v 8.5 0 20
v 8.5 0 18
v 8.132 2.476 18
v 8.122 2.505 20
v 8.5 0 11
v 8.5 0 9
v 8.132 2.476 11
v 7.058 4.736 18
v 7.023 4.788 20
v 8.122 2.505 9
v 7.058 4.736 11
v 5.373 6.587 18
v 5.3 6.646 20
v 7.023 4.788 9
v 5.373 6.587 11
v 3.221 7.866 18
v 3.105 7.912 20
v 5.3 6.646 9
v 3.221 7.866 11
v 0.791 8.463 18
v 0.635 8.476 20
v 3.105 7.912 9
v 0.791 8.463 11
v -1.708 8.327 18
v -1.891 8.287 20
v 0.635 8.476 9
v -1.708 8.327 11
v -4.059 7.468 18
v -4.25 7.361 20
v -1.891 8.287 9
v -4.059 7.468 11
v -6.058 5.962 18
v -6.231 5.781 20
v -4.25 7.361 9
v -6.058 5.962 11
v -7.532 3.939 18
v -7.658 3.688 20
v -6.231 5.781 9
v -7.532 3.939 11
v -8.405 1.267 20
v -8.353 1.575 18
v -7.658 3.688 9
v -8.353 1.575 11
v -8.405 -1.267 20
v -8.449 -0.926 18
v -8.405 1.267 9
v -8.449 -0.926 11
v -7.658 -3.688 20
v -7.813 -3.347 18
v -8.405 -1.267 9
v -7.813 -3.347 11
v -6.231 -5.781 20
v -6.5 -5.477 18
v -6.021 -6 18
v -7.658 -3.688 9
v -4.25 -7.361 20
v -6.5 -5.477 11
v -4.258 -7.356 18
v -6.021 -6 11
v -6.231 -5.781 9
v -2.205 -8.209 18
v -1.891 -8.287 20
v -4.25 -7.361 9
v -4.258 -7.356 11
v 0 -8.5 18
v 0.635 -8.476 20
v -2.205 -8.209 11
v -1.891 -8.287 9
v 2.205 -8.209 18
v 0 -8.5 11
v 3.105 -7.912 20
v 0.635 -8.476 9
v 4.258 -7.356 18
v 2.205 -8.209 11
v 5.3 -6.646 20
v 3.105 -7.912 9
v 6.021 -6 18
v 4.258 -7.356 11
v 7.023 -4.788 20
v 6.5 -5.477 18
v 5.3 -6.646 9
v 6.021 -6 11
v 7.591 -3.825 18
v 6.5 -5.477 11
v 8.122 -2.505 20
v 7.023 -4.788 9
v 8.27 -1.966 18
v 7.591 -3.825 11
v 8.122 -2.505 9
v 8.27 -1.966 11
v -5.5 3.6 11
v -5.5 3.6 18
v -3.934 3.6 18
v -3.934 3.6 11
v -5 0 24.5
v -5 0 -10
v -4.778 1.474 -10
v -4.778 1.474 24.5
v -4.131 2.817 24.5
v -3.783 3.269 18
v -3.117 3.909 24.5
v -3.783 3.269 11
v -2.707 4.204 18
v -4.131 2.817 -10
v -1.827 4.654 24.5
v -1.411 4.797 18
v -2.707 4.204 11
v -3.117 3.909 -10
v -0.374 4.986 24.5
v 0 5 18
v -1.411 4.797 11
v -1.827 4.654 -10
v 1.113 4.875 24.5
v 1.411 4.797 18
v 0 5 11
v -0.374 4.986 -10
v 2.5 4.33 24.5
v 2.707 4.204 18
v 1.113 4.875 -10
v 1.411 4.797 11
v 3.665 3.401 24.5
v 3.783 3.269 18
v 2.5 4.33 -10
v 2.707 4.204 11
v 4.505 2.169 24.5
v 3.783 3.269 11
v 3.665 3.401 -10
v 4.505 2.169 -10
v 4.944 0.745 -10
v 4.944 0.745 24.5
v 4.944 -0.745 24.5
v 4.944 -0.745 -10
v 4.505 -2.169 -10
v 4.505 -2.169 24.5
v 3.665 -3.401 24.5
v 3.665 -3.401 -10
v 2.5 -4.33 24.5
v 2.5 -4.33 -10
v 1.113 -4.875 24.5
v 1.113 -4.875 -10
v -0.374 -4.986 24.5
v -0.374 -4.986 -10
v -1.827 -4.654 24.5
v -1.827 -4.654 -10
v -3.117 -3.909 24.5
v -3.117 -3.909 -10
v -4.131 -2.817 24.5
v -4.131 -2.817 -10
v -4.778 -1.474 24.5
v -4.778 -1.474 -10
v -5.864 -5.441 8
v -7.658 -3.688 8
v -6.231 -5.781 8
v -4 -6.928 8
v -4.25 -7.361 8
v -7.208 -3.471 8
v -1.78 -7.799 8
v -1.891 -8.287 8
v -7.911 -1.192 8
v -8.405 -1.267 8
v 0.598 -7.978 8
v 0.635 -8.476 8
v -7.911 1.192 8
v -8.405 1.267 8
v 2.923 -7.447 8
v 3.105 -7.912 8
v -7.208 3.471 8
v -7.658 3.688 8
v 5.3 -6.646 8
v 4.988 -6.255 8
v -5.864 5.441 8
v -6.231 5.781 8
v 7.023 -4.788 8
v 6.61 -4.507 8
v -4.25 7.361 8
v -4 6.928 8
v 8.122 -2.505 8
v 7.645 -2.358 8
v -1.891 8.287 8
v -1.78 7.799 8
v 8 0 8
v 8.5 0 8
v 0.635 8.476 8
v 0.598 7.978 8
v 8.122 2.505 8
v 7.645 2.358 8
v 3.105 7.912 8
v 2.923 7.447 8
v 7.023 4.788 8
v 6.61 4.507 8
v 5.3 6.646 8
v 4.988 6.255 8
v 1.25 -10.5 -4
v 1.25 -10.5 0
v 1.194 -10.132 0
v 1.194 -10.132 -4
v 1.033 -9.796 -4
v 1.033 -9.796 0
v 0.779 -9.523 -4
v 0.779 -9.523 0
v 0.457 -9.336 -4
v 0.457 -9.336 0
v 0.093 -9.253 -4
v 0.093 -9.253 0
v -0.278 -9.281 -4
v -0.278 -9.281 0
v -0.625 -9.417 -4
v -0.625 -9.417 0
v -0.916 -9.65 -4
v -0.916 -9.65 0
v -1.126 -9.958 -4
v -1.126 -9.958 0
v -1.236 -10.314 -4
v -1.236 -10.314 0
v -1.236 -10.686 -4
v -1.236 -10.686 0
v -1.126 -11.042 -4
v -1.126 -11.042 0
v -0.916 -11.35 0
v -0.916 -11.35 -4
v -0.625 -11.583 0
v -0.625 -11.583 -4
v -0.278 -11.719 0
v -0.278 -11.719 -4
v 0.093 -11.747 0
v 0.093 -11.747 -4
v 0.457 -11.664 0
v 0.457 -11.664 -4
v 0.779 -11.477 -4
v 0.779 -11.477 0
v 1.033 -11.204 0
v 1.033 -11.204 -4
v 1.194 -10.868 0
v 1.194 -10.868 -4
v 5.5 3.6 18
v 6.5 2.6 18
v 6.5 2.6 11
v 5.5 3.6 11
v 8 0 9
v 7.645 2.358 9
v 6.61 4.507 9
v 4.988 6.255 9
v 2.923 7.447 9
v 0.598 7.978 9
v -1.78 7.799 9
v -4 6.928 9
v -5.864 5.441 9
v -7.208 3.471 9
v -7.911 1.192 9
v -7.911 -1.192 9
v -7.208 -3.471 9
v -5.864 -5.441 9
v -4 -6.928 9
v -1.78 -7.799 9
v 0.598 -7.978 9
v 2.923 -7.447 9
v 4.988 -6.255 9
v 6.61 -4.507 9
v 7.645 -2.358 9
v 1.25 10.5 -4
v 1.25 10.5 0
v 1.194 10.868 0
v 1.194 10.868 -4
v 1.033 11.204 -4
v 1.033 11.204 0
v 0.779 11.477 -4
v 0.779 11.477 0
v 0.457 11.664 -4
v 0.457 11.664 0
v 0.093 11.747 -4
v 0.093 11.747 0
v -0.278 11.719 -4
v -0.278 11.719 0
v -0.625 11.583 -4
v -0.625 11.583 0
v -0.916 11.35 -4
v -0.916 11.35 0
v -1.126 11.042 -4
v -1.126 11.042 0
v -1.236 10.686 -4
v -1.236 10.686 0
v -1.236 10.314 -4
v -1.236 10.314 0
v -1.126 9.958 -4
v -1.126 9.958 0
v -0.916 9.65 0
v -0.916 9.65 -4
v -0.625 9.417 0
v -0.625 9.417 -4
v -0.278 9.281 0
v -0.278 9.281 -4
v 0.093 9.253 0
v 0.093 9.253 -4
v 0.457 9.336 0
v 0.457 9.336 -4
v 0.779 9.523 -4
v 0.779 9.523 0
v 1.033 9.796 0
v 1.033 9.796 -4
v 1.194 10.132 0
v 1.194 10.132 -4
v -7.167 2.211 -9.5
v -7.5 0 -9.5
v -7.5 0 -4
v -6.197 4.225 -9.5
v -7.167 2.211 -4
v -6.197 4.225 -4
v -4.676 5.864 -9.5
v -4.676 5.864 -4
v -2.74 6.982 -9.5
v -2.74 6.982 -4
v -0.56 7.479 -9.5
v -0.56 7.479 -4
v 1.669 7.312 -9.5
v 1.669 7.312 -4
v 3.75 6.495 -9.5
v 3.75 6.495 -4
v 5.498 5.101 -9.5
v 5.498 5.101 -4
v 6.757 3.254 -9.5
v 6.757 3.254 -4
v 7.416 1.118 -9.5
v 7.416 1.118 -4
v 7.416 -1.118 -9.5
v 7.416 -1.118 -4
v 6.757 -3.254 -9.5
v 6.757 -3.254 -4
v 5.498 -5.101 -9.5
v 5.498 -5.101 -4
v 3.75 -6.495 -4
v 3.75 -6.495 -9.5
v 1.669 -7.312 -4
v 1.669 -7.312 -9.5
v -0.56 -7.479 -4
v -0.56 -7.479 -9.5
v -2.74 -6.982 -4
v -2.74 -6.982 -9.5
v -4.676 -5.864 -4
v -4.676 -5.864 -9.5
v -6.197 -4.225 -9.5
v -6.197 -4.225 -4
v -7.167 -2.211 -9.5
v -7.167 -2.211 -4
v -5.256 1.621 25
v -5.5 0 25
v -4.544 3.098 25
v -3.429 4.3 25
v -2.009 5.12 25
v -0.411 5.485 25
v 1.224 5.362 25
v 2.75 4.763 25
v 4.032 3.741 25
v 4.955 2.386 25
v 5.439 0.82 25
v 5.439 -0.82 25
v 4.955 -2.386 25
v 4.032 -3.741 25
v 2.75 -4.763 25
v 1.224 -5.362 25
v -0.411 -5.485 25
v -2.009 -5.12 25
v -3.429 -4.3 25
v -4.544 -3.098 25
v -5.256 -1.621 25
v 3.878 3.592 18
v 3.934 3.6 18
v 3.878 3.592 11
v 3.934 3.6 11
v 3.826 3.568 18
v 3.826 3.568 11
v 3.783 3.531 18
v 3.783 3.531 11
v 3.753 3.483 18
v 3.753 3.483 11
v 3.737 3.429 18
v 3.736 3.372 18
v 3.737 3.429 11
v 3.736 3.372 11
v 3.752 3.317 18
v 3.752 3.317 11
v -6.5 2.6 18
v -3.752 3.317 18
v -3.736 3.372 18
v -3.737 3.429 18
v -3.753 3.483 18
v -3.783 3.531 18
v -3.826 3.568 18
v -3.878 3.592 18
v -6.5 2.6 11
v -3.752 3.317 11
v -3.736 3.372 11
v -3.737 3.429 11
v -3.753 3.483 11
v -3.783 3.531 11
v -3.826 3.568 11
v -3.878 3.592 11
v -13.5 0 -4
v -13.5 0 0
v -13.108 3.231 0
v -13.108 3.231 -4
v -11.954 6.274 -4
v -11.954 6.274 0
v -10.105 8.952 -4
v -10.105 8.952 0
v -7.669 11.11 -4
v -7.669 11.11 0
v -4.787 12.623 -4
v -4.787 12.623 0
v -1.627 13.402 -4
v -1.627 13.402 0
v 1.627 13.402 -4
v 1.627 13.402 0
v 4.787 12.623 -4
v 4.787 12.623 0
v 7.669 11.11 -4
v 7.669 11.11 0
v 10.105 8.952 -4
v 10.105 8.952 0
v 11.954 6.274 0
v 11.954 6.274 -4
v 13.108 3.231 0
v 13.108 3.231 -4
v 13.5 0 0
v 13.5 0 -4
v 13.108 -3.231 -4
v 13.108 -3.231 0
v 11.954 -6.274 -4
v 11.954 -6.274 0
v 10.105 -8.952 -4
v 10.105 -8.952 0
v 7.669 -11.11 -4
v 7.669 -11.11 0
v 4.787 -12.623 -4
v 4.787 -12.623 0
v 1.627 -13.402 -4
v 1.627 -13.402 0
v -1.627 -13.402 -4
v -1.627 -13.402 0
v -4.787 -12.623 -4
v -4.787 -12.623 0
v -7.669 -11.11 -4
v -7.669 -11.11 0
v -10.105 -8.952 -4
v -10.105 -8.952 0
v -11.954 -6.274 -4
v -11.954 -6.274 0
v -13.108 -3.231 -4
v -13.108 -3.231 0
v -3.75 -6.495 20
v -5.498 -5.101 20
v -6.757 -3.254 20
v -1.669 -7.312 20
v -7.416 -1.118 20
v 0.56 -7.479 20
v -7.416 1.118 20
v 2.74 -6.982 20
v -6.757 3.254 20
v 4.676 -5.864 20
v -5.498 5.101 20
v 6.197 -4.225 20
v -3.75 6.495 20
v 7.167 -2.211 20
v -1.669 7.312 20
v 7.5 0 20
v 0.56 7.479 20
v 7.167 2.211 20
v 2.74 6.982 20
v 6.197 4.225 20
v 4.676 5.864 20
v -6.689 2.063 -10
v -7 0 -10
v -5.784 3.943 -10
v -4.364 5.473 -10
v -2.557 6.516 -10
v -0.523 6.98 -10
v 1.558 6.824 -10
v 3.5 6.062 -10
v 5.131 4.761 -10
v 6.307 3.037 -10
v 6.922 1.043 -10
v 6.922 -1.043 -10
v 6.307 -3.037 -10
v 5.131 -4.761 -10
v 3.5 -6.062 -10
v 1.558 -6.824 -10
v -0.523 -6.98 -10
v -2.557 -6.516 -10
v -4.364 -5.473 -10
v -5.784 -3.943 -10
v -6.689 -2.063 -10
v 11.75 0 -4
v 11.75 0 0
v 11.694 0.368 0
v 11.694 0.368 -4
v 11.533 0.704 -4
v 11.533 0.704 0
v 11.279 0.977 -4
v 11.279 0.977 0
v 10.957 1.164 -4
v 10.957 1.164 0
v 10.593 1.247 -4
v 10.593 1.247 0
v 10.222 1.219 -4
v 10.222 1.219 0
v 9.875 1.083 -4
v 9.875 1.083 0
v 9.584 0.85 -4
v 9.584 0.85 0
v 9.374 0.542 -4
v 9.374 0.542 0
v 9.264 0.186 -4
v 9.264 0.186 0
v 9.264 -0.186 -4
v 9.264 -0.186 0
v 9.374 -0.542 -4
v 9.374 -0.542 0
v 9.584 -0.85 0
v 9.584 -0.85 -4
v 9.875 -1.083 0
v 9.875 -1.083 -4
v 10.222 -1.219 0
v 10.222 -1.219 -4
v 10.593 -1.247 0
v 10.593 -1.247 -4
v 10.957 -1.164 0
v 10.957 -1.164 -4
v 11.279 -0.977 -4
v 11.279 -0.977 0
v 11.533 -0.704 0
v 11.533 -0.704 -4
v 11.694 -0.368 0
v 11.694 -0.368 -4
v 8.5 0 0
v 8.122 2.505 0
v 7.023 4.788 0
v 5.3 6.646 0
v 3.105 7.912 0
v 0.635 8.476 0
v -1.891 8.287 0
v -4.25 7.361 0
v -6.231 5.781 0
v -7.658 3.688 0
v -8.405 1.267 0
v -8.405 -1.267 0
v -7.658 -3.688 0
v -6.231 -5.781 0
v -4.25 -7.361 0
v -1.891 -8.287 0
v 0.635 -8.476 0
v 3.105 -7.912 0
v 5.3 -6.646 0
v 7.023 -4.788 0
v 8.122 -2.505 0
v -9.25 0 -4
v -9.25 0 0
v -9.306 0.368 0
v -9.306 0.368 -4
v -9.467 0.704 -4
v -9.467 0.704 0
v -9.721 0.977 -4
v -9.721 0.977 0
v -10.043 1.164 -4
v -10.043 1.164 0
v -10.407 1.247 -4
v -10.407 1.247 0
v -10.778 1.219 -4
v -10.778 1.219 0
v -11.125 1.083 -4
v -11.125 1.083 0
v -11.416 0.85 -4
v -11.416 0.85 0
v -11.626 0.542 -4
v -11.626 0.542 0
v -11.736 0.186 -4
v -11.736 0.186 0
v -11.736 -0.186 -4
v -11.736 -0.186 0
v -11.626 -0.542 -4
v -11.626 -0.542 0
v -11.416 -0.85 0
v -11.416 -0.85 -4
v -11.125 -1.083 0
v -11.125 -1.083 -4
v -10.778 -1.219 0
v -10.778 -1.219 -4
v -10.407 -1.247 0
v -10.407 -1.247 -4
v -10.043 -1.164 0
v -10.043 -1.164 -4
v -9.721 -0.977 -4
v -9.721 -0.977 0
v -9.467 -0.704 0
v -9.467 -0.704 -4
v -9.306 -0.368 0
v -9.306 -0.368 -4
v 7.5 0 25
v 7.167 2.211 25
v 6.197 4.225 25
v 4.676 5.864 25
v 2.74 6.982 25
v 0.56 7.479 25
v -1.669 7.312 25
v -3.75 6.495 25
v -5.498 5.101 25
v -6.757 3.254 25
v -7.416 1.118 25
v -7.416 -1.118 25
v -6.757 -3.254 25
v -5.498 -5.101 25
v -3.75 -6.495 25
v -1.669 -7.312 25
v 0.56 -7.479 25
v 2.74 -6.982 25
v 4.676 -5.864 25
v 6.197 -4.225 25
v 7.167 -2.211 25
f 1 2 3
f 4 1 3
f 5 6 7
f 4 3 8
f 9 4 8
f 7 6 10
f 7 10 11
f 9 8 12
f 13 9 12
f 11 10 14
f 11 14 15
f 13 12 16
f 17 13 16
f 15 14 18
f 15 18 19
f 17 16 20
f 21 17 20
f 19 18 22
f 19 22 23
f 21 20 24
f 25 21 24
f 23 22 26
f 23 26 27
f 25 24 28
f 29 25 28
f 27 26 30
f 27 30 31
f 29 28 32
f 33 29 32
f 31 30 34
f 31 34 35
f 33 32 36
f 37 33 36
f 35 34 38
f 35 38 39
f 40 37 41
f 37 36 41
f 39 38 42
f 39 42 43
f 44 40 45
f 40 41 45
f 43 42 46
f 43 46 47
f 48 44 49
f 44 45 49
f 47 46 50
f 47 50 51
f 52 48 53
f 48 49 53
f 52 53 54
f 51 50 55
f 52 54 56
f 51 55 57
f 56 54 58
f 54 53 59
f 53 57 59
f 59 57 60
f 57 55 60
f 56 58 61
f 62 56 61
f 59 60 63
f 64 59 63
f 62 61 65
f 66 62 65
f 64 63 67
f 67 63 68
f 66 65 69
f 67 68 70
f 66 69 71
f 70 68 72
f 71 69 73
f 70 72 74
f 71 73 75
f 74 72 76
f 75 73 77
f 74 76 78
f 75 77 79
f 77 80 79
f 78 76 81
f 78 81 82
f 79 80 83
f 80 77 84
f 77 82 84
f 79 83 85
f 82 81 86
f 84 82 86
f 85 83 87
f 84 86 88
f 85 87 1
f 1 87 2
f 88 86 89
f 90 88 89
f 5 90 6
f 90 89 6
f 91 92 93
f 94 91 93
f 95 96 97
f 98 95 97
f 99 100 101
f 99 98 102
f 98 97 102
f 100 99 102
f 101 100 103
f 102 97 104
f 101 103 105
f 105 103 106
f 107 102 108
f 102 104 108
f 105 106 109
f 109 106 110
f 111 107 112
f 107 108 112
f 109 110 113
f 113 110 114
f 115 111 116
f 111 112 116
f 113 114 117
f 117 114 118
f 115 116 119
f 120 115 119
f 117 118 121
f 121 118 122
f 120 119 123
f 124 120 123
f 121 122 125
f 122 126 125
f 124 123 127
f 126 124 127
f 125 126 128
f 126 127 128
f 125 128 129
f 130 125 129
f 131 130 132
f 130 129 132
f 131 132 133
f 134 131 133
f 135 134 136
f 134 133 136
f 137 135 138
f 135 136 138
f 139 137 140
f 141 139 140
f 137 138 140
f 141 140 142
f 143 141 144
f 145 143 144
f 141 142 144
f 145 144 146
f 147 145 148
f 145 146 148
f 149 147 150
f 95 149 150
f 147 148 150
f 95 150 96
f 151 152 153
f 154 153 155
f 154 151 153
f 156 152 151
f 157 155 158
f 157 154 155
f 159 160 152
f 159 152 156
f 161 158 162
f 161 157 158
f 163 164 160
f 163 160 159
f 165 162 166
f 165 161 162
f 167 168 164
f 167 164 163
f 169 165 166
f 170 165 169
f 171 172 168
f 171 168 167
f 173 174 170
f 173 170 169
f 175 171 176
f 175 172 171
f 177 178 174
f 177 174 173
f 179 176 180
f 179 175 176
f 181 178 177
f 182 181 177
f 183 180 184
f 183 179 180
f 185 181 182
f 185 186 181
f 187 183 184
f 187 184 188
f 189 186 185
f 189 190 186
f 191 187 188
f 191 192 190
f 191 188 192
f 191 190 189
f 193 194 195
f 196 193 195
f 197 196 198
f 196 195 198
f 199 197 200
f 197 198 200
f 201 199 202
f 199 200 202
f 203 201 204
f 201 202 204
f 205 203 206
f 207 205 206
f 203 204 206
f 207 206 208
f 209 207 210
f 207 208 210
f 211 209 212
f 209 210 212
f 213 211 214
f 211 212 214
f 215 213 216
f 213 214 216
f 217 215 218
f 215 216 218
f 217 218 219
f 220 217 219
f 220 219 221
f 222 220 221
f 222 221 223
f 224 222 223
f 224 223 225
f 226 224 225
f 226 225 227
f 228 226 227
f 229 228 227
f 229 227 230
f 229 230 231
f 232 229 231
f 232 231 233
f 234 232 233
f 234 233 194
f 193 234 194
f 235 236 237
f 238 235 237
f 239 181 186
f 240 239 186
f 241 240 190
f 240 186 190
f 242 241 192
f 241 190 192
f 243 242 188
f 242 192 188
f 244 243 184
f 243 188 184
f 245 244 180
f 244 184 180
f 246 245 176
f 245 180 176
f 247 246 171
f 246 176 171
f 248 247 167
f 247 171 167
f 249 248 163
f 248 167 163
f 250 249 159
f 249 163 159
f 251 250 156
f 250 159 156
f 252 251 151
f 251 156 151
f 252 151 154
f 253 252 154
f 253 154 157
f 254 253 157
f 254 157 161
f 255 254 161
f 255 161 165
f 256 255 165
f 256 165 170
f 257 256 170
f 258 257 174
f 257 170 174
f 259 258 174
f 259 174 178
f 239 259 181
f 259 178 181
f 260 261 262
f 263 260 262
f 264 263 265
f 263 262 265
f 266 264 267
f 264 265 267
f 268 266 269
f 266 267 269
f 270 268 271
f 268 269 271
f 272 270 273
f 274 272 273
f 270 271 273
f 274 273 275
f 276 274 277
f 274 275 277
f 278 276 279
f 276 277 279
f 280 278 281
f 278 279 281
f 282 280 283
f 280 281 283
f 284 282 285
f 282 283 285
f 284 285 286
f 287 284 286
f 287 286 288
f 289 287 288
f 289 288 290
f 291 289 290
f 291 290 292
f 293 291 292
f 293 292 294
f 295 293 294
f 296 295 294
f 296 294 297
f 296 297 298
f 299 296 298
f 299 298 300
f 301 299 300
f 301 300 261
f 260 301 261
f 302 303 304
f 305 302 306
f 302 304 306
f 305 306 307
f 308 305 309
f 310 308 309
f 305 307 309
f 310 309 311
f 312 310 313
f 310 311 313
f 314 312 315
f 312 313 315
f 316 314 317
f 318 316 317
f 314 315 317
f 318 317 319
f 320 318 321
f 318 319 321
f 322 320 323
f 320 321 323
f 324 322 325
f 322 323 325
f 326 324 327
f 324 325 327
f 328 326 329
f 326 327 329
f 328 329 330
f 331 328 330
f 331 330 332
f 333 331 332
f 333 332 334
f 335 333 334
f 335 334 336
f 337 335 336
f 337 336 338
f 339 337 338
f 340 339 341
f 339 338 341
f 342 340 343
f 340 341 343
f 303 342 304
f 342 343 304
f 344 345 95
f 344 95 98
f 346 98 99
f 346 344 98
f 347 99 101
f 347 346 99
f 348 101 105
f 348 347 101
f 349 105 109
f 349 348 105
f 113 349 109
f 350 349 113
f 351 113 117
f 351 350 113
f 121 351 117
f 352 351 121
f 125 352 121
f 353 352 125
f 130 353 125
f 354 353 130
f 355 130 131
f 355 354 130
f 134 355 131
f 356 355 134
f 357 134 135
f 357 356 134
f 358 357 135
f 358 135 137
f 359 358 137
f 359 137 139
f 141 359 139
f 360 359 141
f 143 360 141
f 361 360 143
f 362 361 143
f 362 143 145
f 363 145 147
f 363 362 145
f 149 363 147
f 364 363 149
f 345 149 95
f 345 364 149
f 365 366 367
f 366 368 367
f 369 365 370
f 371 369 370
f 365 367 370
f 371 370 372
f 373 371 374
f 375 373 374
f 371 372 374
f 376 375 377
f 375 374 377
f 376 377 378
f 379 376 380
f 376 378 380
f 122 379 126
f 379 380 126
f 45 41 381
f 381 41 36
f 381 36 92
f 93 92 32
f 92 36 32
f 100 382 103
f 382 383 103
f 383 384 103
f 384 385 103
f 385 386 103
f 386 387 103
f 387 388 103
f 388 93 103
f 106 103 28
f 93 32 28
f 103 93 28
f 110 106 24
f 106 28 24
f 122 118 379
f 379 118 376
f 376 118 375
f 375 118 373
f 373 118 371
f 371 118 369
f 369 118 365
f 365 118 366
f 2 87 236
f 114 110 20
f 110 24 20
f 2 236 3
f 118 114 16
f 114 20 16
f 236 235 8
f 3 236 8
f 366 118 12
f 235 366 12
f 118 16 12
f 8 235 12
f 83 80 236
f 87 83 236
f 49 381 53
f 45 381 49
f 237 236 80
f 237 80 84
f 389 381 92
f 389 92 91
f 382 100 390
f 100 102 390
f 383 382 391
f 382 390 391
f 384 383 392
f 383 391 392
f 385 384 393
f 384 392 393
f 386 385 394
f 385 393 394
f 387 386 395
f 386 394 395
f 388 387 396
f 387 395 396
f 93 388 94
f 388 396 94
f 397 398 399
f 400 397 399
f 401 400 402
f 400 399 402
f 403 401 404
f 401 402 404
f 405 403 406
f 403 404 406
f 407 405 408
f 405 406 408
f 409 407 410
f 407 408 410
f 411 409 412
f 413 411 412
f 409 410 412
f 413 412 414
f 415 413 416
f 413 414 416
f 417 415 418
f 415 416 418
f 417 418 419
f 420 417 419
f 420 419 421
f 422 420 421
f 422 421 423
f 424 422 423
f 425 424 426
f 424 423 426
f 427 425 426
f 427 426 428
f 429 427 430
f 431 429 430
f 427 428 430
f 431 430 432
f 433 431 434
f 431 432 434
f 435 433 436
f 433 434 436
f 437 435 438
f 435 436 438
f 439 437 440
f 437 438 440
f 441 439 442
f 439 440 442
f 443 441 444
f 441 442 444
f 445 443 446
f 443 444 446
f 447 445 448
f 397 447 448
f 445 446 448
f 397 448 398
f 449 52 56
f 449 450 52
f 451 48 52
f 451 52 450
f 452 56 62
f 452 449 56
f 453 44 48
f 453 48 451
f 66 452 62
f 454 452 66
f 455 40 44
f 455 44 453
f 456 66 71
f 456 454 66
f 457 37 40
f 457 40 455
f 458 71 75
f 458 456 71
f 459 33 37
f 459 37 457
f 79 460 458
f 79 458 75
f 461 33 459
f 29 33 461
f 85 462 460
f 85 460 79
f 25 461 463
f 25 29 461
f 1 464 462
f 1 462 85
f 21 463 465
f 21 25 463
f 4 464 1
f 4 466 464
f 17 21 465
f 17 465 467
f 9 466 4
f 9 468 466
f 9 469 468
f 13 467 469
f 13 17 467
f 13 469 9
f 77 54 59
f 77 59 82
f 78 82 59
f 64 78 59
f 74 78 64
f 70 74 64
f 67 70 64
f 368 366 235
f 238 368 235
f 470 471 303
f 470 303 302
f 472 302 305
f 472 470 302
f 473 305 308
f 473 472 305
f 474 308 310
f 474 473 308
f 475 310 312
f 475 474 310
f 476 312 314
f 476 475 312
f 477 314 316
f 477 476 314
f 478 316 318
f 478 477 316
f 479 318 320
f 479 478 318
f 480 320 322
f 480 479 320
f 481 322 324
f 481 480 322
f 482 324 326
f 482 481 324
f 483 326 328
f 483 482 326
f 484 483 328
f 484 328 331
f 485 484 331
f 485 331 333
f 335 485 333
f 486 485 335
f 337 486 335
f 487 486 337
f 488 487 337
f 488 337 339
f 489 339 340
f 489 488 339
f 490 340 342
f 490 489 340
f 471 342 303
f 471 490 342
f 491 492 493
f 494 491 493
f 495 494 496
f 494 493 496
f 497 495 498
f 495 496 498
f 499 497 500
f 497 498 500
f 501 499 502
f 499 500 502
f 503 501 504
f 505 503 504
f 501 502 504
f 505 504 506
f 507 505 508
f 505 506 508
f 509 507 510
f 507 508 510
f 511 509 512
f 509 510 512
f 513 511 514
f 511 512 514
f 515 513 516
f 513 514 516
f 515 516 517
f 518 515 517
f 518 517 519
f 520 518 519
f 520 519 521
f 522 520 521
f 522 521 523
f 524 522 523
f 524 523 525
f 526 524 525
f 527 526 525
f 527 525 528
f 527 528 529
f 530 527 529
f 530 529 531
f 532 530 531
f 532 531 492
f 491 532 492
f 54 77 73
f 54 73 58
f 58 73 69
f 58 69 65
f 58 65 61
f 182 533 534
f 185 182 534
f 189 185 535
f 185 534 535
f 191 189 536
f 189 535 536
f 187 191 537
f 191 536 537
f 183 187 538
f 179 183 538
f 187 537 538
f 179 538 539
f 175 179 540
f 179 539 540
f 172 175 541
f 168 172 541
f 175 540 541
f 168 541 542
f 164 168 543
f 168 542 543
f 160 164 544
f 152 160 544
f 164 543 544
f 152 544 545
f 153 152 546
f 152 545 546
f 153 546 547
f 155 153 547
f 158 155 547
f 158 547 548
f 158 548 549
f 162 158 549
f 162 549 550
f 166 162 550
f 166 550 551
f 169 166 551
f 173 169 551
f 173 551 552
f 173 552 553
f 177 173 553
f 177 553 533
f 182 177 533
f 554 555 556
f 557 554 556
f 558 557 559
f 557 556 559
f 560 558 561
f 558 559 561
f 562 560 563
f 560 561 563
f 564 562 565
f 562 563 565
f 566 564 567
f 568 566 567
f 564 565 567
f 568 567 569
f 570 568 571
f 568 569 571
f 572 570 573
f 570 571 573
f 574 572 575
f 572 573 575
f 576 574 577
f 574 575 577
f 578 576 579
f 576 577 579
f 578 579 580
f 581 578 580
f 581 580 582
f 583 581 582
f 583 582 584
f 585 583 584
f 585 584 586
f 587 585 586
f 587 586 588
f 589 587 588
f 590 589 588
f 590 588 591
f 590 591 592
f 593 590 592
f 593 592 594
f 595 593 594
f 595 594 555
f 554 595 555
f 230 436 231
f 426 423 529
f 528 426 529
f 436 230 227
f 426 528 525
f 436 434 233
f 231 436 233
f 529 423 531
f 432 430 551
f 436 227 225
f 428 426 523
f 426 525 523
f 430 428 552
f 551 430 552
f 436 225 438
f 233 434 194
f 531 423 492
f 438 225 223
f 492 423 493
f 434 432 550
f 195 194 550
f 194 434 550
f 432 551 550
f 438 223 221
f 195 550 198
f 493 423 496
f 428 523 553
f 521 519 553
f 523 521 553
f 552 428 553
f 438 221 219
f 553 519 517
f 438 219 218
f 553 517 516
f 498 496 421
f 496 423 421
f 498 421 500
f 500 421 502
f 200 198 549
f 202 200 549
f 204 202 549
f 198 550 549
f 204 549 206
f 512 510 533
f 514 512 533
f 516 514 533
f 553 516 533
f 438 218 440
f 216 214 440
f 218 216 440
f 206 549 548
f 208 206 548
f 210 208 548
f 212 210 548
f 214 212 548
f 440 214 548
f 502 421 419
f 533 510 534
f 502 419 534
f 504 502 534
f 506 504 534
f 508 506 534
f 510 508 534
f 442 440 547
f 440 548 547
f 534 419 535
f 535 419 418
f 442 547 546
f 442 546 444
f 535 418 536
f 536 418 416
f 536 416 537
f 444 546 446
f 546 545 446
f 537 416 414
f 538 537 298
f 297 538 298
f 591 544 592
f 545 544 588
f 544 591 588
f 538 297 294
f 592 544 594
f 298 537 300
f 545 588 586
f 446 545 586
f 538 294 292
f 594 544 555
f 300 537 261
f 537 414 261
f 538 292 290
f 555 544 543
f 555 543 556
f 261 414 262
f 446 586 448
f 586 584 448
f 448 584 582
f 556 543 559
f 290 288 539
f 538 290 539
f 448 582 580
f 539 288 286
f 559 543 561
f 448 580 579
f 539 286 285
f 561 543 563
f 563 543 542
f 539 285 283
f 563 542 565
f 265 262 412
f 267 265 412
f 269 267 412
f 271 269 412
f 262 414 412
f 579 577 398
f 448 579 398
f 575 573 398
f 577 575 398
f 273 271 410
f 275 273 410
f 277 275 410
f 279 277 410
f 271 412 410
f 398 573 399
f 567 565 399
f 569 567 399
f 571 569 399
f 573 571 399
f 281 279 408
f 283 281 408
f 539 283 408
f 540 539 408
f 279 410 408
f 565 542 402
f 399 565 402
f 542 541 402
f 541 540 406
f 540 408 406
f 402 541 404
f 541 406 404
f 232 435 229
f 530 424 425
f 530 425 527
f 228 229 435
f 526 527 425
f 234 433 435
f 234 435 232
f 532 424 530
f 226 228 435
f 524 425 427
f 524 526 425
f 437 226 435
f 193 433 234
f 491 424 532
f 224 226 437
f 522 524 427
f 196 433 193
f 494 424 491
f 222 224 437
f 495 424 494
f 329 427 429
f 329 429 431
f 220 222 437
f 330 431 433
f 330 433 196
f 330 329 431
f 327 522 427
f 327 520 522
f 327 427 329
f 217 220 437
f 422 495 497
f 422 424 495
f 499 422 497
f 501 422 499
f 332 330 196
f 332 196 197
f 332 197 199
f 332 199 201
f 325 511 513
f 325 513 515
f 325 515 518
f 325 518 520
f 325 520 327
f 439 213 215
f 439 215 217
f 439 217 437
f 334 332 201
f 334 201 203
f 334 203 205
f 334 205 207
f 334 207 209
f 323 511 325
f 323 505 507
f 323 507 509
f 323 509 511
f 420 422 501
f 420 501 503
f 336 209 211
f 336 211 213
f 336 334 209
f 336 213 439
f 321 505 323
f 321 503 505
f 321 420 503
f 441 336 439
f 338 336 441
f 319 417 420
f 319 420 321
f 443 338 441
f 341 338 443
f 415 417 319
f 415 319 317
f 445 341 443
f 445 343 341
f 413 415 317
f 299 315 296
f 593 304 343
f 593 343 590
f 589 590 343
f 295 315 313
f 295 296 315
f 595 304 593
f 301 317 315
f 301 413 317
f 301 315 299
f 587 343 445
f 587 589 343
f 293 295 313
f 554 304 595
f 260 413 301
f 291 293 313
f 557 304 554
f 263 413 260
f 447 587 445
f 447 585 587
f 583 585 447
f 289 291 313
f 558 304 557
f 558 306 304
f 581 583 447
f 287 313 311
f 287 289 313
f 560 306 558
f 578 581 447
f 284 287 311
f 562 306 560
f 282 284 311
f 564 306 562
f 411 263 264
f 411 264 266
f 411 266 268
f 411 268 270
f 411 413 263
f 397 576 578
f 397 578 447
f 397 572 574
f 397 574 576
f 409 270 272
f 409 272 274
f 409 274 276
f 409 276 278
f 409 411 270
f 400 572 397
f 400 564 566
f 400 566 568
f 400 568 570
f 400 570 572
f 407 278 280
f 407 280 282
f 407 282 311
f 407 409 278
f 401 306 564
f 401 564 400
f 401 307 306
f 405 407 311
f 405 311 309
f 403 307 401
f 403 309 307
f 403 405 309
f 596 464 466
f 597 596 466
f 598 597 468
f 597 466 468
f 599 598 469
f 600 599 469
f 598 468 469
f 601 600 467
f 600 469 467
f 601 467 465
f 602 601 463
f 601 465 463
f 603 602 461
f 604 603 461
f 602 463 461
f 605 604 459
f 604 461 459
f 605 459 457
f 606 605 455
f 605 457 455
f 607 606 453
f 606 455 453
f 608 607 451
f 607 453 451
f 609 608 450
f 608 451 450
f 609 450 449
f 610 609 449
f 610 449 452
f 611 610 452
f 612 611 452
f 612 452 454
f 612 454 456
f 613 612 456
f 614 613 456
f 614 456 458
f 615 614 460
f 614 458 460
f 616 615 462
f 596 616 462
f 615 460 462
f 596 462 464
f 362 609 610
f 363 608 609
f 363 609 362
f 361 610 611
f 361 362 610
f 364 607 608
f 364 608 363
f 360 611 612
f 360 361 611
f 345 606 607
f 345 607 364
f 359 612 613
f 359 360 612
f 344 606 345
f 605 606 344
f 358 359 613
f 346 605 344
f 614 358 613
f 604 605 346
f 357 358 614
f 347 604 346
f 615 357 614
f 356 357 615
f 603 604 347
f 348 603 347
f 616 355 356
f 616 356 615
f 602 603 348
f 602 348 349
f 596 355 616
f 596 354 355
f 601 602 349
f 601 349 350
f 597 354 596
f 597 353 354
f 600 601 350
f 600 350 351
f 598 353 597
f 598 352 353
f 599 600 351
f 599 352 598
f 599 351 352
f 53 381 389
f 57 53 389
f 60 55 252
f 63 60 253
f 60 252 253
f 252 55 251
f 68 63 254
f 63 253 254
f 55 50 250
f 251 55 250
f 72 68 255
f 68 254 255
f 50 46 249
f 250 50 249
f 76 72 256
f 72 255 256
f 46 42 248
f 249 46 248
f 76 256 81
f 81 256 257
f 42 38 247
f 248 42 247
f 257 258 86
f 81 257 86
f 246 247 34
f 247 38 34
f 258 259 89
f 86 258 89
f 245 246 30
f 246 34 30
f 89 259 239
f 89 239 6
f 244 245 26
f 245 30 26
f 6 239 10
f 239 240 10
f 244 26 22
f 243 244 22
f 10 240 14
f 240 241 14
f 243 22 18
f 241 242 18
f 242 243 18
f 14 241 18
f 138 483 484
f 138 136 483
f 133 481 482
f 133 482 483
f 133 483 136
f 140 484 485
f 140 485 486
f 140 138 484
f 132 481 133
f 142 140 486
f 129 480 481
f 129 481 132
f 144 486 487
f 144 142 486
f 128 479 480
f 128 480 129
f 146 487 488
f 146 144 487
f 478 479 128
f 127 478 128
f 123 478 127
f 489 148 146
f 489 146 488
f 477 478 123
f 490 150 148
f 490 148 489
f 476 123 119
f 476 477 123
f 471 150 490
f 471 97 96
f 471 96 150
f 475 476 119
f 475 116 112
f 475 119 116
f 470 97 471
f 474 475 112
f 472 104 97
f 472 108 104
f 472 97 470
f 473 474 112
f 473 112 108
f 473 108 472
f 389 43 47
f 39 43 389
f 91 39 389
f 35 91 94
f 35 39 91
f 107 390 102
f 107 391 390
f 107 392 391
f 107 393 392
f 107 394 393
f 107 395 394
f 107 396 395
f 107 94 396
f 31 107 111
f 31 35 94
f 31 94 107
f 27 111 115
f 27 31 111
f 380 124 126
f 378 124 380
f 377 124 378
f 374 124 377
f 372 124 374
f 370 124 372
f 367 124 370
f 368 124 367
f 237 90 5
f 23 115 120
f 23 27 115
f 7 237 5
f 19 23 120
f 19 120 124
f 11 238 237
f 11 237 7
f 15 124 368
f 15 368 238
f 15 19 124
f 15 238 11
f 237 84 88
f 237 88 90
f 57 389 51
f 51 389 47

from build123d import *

# Parameters (mm, degrees)
SKETCH_1_R             = 8.5
EXTRUDE_1_DEPTH        = 20
SKETCH_2_R             = 7.5
EXTRUDE_2_DEPTH        = 5
SKETCH_3_R             = 8.5
SKETCH_3_R_2           = 8
CUT_EXTRUDE_1_DEPTH    = 1
SKETCH_5_R             = 13.5
EXTRUDE_3_DEPTH        = 4
SKETCH_7_R             = 7.5
EXTRUDE_4_DEPTH        = 6
SKETCH_9_R             = 5
CUT_EXTRUDE_3_DEPTH    = 36
CHAMFER_2_SIZE         = 0.5
CUT_EXTRUDE_4_DEPTH    = 7
SKETCH_12_W            = 4
SKETCH_12_H            = 7
CUT_EXTRUDE_5_DEPTH    = 18.1
CHAMFER_3_SIZE         = 0.5
CHAMFER_4_SIZE         = 1
FILLET_1_R             = 0.2
HOLE_WIZARD_M3_1_D     = 2.5
HOLE_WIZARD_M3_1_DEPTH = 4


with BuildPart() as part:
    # 草图1 → 凸台-拉伸1 (new body)
    with BuildSketch(Plane.XY):
        Circle(SKETCH_1_R)
    extrude(amount=EXTRUDE_1_DEPTH)

    # 草图2 → 凸台-拉伸2 (add)
    with BuildSketch(Plane.XY.offset(20)):
        Circle(SKETCH_2_R)
    extrude(amount=EXTRUDE_2_DEPTH)

    # 草图3 → 切除-拉伸1 (cut)
    with BuildSketch(Plane.XY.offset(8)):
        Circle(SKETCH_3_R)
        Circle(SKETCH_3_R_2, mode=Mode.SUBTRACT)
    extrude(amount=CUT_EXTRUDE_1_DEPTH, mode=Mode.SUBTRACT)

    # 草图5 → 凸台-拉伸3 (add)
    with BuildSketch(Plane(origin=(0, 0, 0), x_dir=(-1, 0, 0), z_dir=(0, 0, -1))):
        Circle(SKETCH_5_R)
    extrude(amount=EXTRUDE_3_DEPTH)

    # 草图7 → 凸台-拉伸4 (add)
    with BuildSketch(Plane(origin=(0, 0, -4), x_dir=(-1, 0, 0), z_dir=(0, 0, -1))):
        Circle(SKETCH_7_R)
    extrude(amount=EXTRUDE_4_DEPTH)

    # 草图9 → 切除-拉伸3 (cut, through all)
    with BuildSketch(Plane(origin=(0, 0, -10), x_dir=(-1, 0, 0), z_dir=(0, 0, -1))):
        Circle(SKETCH_9_R)
    extrude(amount=-CUT_EXTRUDE_3_DEPTH, mode=Mode.SUBTRACT)

    # 倒角2
    chamfer_2_edges = [part.edges().sort_by_distance(p)[0] for p in [
        (7.5, 0, -10),
    ]]
    chamfer(chamfer_2_edges, length=CHAMFER_2_SIZE)

    # 草图10 → 切除-拉伸4 (cut)
    with BuildSketch(Plane.XY.offset(18)):
        with BuildLine():
            Line((-7.7, 3.6), (7.7, 3.6))
            ThreePointArc((7.7, 3.6), (0, 8.5), (-7.7, 3.6))
        make_face()
        with BuildLine():
            Line((-6.020797289, -6), (6.020797289, -6))
            ThreePointArc((6.020797289, -6), (0, -8.5), (-6.020797289, -6))
        make_face()
    extrude(amount=-CUT_EXTRUDE_4_DEPTH, mode=Mode.SUBTRACT)

    # 草图12 → 切除-拉伸5 (cut, through all)
    with BuildSketch(Plane(origin=(0, 3.6, 0), x_dir=(1, 0, 0), z_dir=(0, 1, 0))):
        with Locations((-8.5, -14.5)):
            Rectangle(SKETCH_12_W, SKETCH_12_H)
        with Locations((8.5, -14.5)):
            Rectangle(SKETCH_12_W, SKETCH_12_H)
    extrude(amount=-CUT_EXTRUDE_5_DEPTH, mode=Mode.SUBTRACT)

    # 倒角3
    chamfer_3_edges = [part.edges().sort_by_distance(p)[0] for p in [
        (5, 0, 25),
    ]]
    chamfer(chamfer_3_edges, length=CHAMFER_3_SIZE)

    # 倒角4
    chamfer_4_edges = [part.edges().sort_by_distance(p)[0] for p in [
        (-6.5, 3.6, 14.5),
        (6.5, 3.6, 14.5),
    ]]
    chamfer(chamfer_4_edges, length=CHAMFER_4_SIZE)

    # 圆角1
    fillet_1_edges = [part.edges().sort_by_distance(p)[0] for p in [
        (3.469870315, 3.6, 14.5),
        (-3.469870315, 3.6, 14.5),
    ]]
    fillet(fillet_1_edges, radius=FILLET_1_R)

    # M3 螺纹孔1
    with Locations(Plane(origin=(0, 0, -4), x_dir=(-1, 0, 0), z_dir=(0, 0, -1))):
        with Locations((-10.5, 0), (0, 10.5), (10.5, 0), (0, -10.5)):
            Hole(HOLE_WIZARD_M3_1_D / 2, depth=HOLE_WIZARD_M3_1_DEPTH)


solid = part.part
